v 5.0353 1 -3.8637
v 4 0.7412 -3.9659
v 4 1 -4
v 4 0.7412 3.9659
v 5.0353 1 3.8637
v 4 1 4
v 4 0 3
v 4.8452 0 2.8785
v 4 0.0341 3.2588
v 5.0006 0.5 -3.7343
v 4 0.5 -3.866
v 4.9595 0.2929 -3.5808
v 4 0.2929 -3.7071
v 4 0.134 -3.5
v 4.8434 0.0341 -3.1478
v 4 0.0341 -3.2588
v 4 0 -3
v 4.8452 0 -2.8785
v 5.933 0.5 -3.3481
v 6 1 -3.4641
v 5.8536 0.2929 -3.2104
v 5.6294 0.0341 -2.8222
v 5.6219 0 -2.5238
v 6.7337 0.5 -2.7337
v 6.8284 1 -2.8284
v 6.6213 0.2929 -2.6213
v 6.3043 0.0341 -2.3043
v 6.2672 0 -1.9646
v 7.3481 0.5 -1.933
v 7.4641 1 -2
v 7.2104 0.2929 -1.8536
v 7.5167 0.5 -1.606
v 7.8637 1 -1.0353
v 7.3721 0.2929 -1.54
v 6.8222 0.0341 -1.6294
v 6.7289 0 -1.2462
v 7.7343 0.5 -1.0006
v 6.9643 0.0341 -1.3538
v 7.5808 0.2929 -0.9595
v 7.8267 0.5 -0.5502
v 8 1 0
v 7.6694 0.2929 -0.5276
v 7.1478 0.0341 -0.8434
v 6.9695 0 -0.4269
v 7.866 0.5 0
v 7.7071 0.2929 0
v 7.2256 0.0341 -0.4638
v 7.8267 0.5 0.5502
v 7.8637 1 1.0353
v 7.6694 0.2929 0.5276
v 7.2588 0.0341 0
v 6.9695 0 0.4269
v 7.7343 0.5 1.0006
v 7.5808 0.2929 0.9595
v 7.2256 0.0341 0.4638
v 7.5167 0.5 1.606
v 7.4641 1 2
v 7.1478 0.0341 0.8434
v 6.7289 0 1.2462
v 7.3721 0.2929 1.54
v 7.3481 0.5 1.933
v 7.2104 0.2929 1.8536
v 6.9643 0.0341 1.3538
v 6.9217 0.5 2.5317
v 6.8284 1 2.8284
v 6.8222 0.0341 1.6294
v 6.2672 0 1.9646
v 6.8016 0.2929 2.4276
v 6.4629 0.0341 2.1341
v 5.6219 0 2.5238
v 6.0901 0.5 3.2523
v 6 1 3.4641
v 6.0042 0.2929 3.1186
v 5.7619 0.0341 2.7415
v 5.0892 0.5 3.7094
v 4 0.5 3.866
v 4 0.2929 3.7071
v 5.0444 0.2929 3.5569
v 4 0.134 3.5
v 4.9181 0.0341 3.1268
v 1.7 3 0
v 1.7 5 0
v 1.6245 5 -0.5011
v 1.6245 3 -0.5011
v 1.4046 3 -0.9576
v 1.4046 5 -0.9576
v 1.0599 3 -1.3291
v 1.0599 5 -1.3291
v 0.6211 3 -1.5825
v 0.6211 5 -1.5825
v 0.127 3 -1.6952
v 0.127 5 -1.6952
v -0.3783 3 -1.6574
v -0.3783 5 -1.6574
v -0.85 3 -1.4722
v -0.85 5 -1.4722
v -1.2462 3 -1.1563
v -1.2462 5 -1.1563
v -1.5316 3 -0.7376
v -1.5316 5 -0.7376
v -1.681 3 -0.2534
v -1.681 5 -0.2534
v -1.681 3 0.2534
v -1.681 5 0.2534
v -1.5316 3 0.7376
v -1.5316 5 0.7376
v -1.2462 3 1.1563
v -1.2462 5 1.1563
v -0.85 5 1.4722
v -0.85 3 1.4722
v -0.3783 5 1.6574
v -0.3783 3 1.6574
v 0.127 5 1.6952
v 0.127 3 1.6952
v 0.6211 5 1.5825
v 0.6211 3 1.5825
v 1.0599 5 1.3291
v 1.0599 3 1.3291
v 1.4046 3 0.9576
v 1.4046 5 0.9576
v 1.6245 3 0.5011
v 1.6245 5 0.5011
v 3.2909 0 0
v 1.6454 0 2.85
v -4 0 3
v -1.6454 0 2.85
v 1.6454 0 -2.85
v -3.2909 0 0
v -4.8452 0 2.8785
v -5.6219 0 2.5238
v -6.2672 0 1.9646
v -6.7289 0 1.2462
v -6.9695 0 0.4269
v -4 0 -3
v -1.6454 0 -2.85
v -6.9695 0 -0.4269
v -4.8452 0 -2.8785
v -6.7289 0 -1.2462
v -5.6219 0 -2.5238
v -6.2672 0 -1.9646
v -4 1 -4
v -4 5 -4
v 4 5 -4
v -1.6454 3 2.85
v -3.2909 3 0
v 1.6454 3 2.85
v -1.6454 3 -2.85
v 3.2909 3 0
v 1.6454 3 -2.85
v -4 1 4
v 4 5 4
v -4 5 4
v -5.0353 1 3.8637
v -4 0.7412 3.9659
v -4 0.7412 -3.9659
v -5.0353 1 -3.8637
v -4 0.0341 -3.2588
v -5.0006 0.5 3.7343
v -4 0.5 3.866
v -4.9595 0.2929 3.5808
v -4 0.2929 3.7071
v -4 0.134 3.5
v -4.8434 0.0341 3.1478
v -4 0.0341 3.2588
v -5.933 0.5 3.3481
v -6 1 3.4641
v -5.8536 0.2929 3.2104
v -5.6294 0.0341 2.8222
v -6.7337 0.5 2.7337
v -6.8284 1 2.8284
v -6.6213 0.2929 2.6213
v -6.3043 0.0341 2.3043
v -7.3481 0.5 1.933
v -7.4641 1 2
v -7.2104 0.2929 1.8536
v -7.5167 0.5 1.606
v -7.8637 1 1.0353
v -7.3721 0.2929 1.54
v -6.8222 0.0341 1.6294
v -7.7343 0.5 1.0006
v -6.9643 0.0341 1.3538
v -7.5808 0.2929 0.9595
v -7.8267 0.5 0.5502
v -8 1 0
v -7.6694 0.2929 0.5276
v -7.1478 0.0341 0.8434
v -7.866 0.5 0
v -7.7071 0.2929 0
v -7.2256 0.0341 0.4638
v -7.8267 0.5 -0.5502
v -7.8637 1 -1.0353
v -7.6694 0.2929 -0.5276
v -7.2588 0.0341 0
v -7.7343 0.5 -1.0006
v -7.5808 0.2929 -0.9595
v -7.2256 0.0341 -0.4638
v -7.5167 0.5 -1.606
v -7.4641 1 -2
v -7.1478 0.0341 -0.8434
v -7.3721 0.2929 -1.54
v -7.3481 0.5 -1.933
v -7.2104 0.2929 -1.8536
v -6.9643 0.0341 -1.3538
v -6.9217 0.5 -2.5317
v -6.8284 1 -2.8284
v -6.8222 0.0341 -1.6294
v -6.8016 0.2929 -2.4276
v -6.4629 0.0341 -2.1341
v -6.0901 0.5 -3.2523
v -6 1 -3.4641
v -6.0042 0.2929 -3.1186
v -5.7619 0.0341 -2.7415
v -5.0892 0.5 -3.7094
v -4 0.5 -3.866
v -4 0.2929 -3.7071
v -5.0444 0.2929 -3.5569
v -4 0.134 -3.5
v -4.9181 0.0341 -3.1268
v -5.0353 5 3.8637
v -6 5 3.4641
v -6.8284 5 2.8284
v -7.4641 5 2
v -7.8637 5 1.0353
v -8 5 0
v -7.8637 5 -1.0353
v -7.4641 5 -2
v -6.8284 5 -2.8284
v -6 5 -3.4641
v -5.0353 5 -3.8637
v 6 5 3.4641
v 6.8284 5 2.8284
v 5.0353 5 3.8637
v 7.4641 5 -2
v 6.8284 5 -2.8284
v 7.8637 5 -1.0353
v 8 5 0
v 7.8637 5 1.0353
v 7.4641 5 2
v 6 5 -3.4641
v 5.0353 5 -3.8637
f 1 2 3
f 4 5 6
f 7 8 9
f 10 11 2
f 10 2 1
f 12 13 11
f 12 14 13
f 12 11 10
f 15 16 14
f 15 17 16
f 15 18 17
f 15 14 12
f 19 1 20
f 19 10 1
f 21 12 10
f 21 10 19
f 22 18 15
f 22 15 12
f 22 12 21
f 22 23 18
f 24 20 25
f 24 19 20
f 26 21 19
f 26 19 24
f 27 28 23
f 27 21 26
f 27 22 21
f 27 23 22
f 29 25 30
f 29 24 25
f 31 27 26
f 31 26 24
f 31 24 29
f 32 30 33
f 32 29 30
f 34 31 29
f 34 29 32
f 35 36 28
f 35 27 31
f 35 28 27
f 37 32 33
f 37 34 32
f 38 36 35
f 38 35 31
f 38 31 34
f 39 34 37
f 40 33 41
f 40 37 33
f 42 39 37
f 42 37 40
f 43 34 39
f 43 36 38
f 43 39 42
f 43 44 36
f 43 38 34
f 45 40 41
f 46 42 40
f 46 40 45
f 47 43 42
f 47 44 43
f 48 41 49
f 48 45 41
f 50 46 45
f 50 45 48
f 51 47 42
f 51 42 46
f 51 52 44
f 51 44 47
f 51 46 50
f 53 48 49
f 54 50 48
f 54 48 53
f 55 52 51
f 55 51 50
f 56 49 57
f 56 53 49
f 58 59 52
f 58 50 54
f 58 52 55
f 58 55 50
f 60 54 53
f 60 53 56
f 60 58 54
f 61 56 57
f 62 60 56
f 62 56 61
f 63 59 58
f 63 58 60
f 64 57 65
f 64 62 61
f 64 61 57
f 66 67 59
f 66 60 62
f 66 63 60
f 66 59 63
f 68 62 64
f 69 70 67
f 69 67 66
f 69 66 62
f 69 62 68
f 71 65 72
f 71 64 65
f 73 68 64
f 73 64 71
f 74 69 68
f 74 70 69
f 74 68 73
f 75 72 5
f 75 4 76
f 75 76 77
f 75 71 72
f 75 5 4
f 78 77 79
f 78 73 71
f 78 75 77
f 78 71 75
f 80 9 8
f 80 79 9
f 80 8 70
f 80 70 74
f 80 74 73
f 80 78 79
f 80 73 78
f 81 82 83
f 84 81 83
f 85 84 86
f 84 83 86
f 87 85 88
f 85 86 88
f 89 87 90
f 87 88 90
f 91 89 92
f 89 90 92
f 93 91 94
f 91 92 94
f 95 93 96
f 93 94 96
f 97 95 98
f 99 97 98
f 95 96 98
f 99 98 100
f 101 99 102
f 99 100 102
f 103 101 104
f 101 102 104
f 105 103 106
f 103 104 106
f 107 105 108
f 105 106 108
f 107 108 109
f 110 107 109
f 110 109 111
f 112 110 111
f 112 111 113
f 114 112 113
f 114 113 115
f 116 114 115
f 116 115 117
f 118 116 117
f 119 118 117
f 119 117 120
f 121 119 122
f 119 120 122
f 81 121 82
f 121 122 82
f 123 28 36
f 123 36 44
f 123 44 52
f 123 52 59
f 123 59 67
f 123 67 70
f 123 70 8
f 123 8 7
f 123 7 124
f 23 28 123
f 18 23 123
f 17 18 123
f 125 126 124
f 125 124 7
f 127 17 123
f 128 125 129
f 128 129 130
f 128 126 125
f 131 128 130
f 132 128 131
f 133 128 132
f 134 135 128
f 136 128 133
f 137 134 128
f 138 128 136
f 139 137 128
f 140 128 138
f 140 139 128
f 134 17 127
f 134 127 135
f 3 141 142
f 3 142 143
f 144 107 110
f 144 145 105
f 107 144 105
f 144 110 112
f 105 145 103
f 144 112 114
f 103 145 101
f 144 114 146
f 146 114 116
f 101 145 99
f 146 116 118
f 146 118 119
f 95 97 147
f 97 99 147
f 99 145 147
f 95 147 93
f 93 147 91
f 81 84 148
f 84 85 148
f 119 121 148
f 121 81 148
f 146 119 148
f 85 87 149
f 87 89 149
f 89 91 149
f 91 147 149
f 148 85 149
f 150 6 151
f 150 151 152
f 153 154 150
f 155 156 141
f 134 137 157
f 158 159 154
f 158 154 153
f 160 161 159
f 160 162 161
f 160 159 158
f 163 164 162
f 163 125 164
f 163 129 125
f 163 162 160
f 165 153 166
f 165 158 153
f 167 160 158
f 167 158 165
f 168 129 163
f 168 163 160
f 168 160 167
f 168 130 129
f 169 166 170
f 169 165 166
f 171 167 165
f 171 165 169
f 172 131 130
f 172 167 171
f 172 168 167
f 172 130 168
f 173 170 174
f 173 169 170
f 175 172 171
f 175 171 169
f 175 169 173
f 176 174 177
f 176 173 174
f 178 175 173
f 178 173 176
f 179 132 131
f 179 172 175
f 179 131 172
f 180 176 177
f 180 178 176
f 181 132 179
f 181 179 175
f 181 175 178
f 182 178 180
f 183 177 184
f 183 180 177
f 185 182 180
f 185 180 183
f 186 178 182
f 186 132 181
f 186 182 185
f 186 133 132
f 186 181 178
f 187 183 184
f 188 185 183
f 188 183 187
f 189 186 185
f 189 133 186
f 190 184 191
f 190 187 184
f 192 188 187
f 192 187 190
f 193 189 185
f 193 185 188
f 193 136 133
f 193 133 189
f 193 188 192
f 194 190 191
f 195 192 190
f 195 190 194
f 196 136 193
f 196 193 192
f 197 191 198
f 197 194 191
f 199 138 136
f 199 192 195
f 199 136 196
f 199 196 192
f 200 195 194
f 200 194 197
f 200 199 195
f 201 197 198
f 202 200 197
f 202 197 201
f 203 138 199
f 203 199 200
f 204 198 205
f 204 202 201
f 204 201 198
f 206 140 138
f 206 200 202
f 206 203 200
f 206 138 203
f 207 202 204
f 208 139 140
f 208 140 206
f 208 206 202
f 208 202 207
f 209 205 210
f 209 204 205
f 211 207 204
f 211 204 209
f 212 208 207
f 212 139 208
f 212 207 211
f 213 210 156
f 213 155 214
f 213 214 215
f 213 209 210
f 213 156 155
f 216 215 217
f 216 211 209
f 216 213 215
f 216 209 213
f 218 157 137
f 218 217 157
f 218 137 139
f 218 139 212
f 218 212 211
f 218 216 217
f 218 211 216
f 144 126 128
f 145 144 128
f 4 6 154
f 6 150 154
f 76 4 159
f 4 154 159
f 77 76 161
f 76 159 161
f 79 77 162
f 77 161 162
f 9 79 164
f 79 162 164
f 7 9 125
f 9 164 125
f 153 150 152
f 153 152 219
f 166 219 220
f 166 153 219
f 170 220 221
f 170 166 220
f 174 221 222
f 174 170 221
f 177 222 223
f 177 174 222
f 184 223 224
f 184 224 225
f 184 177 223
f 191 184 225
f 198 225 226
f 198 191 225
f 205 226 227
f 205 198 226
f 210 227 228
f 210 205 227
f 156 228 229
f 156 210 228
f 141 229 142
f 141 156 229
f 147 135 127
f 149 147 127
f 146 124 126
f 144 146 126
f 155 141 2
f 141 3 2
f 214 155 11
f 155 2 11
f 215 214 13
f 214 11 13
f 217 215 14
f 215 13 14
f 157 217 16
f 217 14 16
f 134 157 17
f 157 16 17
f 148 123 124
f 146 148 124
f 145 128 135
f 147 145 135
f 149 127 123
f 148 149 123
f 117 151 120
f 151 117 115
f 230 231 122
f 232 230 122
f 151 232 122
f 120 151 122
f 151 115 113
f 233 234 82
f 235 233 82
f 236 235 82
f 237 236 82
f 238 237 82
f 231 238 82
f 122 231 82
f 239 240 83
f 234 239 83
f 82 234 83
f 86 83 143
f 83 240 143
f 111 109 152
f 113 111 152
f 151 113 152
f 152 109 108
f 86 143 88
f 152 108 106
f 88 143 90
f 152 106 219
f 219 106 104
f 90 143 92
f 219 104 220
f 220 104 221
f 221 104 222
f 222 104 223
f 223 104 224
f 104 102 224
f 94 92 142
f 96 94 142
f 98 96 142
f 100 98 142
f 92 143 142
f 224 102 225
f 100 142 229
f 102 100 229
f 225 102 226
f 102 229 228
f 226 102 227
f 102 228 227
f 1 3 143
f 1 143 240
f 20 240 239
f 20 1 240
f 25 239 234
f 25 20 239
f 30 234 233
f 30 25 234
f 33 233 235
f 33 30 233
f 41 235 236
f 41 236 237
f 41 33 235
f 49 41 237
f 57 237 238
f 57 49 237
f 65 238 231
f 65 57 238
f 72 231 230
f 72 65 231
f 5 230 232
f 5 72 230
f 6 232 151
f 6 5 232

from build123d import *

# Parameters (mm, degrees)
BOSS_EXTRU_1_DEPTH = 5
ESQUISSE2_R        = 1.7
BOSS_EXTRU_2_DEPTH = 2
CONG_1_R           = 1


with BuildPart() as part:
    # Esquisse1 → Boss.-Extru.1 (new body)
    with BuildSketch(Plane(origin=(0, 0, 0), x_dir=(1, 0, 0), z_dir=(0, 1, 0))):
        with BuildLine():
            Line((-4, 4), (4, 4))
            ThreePointArc((4, 4), (8, 0), (4, -4))
            Line((4, -4), (-4, -4))
            ThreePointArc((-4, -4), (-8, 0), (-4, 4))
        make_face()
        Polygon((-1.645448267, 2.85), (1.645448267, 2.85), (3.290896534, 0), (1.645448267, -2.85), (-1.645448267, -2.85), (-3.290896534, 0), align=None, mode=Mode.SUBTRACT)
    extrude(amount=BOSS_EXTRU_1_DEPTH)

    # Esquisse2 → Boss.-Extru.2 (add)
    with BuildSketch(Plane(origin=(0, 5, 0), x_dir=(1, 0, 0), z_dir=(0, 1, 0))):
        with BuildLine():
            Line((-4, -4), (4, -4))
            ThreePointArc((4, -4), (8, 0), (4, 4))
            Line((4, 4), (-4, 4))
            ThreePointArc((-4, 4), (-8, 0), (-4, -4))
        make_face()
        Circle(ESQUISSE2_R, mode=Mode.SUBTRACT)
    extrude(amount=-BOSS_EXTRU_2_DEPTH)

    # Congé1
    cong_1_edges = [part.edges().sort_by_distance(p)[0] for p in [
        (0, 0, -4),
        (8, 0, 0),
        (0, 0, 4),
        (-8, 0, 0),
    ]]
    fillet(cong_1_edges, radius=CONG_1_R)


solid = part.part
